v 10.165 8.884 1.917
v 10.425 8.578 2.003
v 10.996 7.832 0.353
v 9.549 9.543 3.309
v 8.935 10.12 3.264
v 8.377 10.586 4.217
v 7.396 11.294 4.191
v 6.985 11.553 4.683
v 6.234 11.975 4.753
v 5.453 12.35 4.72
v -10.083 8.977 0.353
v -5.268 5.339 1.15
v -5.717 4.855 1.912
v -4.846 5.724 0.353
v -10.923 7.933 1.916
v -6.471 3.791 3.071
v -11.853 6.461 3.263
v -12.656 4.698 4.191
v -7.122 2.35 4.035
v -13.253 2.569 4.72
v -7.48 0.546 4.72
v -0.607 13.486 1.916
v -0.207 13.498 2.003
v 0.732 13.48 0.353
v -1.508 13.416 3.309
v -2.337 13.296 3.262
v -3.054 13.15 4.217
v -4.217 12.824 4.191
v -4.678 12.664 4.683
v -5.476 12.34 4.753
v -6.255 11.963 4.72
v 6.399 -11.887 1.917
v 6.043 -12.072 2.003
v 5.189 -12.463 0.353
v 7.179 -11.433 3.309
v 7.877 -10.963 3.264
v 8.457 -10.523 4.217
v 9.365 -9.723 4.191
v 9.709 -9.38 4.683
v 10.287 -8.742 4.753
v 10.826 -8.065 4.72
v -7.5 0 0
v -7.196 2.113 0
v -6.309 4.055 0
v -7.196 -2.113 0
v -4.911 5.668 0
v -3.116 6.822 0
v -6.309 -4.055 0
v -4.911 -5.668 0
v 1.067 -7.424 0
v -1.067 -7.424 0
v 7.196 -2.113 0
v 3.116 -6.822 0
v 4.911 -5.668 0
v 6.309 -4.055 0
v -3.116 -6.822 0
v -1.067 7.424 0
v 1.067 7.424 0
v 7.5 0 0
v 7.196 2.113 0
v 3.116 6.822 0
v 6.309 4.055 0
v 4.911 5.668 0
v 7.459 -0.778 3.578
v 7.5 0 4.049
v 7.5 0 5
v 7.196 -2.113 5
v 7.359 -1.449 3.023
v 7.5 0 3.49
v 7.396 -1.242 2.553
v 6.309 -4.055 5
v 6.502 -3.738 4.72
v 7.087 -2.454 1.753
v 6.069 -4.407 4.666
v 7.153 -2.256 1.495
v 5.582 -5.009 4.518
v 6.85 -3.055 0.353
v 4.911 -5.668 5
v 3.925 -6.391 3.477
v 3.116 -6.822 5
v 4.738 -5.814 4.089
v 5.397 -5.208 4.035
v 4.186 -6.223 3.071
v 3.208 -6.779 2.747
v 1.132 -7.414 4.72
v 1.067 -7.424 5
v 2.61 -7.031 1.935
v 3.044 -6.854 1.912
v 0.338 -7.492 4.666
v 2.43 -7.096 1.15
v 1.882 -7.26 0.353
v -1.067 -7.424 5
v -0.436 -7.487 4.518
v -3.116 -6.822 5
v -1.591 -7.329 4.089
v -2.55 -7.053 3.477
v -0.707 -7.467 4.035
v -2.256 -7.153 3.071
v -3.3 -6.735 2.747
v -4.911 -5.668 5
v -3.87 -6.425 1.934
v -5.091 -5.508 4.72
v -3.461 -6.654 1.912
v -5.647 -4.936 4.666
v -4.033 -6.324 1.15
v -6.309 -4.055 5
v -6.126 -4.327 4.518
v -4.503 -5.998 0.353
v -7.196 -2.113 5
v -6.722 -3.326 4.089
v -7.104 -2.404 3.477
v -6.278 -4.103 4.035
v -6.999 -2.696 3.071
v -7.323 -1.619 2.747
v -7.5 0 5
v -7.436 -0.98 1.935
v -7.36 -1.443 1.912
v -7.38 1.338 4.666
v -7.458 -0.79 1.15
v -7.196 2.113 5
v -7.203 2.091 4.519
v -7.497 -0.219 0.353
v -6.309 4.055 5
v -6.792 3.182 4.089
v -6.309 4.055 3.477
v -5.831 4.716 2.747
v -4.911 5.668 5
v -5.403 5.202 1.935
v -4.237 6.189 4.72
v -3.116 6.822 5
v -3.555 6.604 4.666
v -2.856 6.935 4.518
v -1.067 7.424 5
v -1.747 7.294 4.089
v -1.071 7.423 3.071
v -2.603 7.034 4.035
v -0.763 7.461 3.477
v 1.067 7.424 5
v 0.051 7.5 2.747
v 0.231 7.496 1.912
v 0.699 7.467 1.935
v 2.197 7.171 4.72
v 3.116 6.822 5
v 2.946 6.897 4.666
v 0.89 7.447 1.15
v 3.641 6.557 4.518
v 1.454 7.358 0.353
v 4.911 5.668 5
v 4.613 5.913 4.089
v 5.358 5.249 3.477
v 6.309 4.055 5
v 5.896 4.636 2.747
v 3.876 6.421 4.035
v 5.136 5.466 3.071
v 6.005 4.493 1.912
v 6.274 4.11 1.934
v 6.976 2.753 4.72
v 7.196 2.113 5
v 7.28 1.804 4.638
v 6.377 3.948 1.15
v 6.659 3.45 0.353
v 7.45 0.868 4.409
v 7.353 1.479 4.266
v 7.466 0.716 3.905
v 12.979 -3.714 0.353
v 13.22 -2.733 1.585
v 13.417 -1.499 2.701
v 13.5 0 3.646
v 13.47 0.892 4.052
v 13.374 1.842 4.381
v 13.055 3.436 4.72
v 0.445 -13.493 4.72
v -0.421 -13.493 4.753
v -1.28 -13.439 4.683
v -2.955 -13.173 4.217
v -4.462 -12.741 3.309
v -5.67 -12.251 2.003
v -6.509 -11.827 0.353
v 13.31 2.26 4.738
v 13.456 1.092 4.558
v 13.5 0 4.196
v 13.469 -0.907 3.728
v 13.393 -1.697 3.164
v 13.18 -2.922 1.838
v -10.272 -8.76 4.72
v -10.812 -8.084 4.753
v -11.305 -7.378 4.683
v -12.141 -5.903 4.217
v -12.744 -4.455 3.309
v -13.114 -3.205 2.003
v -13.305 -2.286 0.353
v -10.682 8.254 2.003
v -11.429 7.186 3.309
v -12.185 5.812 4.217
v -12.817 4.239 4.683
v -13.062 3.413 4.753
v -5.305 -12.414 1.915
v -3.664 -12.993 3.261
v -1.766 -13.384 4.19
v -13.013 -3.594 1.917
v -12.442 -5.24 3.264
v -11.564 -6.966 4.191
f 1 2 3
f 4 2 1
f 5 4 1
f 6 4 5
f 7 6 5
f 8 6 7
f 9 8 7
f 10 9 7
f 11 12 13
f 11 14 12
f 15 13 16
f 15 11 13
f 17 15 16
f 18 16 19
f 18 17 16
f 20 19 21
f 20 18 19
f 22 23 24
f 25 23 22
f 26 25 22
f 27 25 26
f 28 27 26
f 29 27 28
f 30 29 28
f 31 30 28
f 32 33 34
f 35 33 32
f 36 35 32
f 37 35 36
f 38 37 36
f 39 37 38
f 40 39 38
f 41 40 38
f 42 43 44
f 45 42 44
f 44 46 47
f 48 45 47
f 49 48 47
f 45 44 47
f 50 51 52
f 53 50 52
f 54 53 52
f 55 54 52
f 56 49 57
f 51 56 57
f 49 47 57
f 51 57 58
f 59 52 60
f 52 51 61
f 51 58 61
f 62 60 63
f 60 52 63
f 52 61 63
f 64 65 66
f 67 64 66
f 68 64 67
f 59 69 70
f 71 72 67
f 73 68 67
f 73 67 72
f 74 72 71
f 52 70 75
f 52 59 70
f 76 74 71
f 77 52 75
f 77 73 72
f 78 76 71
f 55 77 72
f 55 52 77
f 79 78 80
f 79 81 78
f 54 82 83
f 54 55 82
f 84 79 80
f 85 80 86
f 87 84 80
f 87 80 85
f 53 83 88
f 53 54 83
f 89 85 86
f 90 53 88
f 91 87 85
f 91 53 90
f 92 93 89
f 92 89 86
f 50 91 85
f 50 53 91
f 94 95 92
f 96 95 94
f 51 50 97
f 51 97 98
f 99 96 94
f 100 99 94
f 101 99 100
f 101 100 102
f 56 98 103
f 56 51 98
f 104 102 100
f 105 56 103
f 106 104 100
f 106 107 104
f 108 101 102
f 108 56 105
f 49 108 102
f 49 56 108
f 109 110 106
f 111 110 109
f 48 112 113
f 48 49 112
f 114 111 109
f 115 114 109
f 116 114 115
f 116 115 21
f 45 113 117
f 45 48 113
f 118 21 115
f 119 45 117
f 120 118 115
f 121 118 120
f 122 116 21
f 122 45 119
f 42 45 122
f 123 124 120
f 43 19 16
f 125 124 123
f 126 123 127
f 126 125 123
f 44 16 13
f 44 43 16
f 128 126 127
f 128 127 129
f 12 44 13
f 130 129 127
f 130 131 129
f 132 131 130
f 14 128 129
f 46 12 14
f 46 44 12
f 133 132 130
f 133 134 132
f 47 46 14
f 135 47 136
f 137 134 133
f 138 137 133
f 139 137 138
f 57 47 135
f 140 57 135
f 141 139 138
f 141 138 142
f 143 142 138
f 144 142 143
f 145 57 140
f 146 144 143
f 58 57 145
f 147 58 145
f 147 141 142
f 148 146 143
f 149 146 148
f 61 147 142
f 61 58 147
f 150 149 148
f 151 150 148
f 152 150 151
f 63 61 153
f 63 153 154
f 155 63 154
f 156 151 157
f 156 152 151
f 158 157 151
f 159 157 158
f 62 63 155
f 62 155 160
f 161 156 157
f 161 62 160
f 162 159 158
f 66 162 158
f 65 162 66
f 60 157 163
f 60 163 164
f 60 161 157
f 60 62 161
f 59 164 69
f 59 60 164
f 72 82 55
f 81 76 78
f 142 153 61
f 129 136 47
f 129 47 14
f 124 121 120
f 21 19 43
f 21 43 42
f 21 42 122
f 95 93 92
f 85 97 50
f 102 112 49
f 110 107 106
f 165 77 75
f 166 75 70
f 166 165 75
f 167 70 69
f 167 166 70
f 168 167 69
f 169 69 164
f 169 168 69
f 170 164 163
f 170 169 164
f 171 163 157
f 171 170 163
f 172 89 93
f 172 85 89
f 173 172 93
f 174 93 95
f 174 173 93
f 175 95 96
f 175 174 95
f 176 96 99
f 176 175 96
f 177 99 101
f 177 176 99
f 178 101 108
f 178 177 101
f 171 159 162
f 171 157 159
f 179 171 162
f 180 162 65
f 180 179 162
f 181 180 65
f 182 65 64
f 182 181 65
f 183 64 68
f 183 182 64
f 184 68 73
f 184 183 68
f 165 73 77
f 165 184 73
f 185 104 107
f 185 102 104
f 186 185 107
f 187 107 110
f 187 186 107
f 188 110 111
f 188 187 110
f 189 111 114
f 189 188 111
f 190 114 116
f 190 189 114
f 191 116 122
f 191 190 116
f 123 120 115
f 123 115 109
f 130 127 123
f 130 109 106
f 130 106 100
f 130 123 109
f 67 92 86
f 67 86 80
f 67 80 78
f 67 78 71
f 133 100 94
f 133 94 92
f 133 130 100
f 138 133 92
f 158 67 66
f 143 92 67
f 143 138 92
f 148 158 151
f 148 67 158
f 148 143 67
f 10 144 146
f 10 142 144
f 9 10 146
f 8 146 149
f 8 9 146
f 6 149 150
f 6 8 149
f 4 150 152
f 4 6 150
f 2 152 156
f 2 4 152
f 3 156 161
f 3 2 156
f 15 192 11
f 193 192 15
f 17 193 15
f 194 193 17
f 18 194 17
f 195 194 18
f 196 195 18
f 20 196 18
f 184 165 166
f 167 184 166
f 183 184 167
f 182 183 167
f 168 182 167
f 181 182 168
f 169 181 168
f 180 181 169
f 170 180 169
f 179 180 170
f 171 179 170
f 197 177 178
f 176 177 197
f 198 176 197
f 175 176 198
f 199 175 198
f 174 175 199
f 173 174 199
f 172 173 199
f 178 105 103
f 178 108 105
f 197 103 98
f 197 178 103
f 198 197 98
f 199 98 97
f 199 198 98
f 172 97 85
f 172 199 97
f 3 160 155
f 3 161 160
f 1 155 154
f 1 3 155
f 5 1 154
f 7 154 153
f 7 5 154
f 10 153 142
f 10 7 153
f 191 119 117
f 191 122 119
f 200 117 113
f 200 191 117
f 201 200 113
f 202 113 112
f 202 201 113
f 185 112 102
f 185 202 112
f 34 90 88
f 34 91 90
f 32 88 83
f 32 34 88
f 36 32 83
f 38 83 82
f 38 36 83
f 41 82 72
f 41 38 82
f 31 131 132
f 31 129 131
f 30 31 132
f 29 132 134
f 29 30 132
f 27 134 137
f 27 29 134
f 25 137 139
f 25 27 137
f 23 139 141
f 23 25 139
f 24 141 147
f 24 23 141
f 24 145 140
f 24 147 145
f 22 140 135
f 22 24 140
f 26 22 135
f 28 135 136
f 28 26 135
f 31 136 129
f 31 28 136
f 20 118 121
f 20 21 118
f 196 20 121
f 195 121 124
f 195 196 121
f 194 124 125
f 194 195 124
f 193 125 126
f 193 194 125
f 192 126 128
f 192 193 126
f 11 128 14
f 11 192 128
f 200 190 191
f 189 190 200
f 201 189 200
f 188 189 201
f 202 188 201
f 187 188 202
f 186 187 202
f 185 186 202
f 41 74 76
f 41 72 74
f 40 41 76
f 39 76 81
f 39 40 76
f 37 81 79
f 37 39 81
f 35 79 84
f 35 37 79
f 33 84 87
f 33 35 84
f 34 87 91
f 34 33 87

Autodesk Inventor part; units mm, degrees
ref_plane "YZ Plane" through (0, 0, 0) normal (1, 0, 0) x (0, 1, 0)
ref_plane "XZ Plane" through (0, 0, 0) normal (0, 1, 0) x (-1, 0, 0)
ref_plane "Work Plane1" through (14, 0, 0) normal (1, 0, 0) x (0, 0, -1)
sketch "Sketch2" plane through (0, 0, 0) normal (1, 0, 0) x (0, 1, 0)
  arc A0 (1.9695, 4.7202) -> (-2.3191, 0.3527) centre (2.9183, -0.5007) ccw
  arc A1 (1.9695, 4.7202) -> (-2.3191, 0.3527) centre (6.9579, -4.4673) ccw
sketch "Sketch5" plane through (14, 0, 0) normal (1, 0, 0) x (0, 0, -1)
  arc A0 (-4.7202, 3.5423) -> (-0.3527, -3.8232) centre (2.3417, 2.7522) ccw
  arc A1 (-4.7202, 3.5423) -> (-0.3527, -3.8232) centre (5.6636, 4.722) ccw
loft "Loft1" add profiles "Sketch2", "Sketch5"
sketch "Sketch7" plane through (0, 0, 0) normal (0, 0, 1) x (1, 0, 0)
  circle A0 centre (0, 0) radius 7.5
  dimension "d10" = 15
extrude "Extrusion3" add sketch "Sketch7" along normal blind 5
pattern_circular "Circular Pattern1" count 7 over 360 about axis through (0, 0, 0) along (0, 0, 1) of "Loft1"
sketch "Sketch8" plane through (0, 0, 5) normal (0, 0, 1) x (1, 0, 0)
  circle A0 centre (0, 0) radius 7.5 projected
  circle A1 centre (0, 0) radius 13.5
  circle A2 centre (0, 0) radius 15
  dimension "d16" = 27
  dimension "d17" = 30
extrude "Extrusion4" cut sketch "Sketch8" against normal blind 5 contours A2
properties part number "fan_3007_blaze"
